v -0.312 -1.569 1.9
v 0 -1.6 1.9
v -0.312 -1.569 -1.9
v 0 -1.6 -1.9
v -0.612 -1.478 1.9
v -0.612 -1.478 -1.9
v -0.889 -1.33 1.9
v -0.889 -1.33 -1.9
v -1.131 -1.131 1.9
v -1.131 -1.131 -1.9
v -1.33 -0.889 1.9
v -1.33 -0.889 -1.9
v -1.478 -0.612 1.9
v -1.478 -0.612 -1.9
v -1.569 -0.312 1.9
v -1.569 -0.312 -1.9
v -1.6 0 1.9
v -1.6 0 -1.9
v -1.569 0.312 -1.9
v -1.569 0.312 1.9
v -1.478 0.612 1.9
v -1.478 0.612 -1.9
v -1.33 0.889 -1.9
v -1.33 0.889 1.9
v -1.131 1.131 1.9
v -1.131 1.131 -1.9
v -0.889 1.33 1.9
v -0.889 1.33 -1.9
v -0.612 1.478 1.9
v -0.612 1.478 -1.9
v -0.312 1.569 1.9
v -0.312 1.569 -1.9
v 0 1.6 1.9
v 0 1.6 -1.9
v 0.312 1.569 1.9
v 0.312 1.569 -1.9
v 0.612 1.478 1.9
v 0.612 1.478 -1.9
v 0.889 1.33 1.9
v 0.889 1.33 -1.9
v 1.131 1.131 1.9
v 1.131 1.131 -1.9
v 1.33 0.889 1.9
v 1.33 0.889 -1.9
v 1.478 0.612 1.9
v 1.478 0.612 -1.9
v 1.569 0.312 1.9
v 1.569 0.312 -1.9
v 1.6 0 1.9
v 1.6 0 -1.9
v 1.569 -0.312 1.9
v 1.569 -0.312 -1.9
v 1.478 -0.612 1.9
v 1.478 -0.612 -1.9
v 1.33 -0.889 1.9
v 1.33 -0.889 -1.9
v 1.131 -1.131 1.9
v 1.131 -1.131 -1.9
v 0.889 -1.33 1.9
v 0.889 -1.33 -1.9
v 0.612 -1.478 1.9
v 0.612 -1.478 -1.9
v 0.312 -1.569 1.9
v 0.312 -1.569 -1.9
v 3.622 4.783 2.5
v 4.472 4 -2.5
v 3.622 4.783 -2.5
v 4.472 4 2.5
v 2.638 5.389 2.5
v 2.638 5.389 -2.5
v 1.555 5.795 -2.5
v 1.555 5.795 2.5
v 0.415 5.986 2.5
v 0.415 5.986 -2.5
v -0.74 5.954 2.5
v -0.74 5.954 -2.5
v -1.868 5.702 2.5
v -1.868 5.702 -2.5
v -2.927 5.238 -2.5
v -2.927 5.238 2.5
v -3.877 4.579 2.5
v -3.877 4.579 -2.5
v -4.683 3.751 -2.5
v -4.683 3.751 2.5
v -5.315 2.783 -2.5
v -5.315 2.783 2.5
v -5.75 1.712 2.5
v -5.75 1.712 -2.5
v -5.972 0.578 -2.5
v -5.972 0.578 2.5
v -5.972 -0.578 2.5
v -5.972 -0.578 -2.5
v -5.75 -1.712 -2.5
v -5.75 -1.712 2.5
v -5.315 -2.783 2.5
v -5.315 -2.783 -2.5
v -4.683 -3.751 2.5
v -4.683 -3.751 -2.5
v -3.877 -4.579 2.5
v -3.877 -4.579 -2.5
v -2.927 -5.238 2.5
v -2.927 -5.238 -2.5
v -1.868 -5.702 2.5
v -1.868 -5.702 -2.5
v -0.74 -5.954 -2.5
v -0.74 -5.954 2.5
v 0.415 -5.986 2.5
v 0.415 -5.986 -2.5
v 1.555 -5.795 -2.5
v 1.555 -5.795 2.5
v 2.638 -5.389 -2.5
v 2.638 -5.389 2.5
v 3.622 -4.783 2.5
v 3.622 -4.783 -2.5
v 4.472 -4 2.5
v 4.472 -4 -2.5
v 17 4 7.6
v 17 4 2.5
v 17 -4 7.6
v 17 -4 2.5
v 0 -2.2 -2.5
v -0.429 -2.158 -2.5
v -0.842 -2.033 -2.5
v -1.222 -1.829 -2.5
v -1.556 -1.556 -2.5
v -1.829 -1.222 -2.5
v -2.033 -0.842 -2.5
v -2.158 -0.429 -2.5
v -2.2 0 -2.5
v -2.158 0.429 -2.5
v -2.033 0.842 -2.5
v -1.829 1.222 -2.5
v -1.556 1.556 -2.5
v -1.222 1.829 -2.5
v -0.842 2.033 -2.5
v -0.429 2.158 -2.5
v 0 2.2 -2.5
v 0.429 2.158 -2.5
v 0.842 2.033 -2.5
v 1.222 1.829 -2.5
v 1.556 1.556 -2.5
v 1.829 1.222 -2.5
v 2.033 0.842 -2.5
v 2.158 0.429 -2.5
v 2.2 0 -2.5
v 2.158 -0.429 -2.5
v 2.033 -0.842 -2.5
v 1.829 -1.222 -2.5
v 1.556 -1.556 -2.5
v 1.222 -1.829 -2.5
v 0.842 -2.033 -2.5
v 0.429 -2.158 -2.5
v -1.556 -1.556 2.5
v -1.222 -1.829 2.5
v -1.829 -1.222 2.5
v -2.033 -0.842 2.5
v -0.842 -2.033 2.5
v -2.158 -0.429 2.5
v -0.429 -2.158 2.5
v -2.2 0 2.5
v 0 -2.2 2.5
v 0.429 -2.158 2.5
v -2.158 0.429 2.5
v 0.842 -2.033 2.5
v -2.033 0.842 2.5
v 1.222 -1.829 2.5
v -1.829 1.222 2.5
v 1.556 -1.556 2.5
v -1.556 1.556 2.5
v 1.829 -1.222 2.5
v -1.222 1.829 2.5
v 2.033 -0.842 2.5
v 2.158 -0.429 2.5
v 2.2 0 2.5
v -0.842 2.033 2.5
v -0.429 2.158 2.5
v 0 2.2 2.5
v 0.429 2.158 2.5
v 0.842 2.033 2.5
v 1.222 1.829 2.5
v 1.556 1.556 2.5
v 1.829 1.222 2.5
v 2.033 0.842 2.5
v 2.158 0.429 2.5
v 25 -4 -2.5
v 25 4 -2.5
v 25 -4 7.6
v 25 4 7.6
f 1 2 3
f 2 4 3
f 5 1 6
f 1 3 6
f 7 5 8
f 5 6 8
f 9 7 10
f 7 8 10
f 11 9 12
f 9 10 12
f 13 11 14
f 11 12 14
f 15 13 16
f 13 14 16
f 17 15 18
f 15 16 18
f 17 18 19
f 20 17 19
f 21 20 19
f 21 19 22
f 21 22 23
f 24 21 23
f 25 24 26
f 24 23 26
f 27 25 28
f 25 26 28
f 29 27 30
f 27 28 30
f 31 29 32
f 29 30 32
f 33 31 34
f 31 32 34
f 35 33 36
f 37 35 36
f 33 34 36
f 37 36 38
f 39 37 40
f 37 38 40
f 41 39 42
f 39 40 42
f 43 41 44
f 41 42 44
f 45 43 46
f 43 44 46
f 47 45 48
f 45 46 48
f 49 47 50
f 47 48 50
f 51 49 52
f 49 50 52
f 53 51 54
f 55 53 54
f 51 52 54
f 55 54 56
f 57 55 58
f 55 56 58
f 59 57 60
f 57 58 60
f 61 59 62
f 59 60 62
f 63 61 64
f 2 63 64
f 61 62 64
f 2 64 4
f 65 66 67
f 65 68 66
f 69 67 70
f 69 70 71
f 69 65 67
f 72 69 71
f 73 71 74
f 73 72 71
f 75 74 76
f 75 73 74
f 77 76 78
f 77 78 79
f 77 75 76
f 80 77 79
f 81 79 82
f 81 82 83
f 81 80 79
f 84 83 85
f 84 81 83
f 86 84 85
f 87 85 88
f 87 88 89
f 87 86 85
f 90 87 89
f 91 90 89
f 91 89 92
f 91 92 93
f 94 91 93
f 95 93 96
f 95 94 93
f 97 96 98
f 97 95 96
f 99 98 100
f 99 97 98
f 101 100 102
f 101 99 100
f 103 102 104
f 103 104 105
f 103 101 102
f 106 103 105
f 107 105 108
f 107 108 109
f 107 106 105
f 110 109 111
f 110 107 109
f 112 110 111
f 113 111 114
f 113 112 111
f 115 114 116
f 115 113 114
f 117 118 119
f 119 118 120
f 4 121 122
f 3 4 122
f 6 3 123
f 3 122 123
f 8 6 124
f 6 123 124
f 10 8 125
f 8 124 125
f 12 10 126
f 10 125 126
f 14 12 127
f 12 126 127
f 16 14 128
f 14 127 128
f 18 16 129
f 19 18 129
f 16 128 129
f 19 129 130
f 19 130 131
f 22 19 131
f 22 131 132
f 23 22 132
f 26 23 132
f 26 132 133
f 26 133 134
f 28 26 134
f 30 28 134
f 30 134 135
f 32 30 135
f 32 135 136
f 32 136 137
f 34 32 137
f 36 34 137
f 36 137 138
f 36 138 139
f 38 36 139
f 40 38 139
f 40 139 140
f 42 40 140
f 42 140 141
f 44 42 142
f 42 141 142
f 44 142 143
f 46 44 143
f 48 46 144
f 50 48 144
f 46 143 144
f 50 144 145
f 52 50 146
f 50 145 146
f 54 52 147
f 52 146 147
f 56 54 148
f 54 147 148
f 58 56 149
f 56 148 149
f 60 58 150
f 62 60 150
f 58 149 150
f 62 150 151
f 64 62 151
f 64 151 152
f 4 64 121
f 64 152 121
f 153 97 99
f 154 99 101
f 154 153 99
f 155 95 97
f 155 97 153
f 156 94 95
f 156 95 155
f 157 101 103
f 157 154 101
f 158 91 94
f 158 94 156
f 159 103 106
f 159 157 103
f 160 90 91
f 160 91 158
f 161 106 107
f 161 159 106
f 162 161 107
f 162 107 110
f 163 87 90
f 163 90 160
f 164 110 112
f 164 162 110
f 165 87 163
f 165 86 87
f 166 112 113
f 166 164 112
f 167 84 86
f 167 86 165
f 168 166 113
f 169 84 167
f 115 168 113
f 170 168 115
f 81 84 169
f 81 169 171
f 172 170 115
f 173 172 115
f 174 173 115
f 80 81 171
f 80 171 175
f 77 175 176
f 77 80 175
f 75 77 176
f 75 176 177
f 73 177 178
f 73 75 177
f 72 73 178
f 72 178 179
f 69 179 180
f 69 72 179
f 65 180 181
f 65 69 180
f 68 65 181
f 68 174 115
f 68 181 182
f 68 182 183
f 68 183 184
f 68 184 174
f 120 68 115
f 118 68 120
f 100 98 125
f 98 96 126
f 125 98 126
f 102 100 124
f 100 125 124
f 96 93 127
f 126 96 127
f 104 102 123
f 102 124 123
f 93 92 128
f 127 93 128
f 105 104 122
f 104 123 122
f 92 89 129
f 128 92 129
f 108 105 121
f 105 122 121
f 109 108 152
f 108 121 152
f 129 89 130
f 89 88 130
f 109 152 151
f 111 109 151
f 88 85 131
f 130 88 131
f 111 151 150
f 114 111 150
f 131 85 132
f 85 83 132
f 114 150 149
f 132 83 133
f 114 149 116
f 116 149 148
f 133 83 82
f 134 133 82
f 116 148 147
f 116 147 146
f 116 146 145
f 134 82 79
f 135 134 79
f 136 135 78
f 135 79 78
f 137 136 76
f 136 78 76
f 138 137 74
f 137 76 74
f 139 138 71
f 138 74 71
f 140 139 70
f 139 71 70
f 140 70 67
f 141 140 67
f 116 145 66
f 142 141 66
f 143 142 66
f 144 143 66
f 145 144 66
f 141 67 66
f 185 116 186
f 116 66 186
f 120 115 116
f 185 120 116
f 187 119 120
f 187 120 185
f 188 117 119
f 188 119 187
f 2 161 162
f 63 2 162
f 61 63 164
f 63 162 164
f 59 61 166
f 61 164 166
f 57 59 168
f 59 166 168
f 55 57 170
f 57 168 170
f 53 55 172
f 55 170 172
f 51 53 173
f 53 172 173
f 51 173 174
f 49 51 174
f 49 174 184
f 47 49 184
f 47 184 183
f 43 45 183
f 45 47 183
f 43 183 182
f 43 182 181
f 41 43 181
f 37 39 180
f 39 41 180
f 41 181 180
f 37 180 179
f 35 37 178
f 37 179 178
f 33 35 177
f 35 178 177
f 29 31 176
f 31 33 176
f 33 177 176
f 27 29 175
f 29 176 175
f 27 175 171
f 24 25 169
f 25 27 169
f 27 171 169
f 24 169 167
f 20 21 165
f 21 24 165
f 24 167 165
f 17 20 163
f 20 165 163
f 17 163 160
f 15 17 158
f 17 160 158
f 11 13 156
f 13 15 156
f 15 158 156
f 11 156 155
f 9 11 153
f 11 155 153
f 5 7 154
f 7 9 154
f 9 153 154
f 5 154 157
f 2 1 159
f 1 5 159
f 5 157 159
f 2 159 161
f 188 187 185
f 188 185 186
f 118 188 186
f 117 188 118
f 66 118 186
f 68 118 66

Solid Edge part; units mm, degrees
sketch "Sketch1" plane through (0, 0, 0) normal (0, 0, 1) x (1, 0, 0)
  circle A0 centre (0, 0) radius 6
  dimension "D1" = 12
extrude "Protrusion1" add sketch "Sketch1" along normal mid plane 5
hole "hole" at (0, 0, 2.5) direction (0, 0, -1) diameter 3.2 depth 30 tip angle 118 start chamfer 0.6 start chamfer angle 45 end chamfer 0.6 end chamfer angle 45
sketch "Sketch2" plane through (0, 0, 2.5) normal (0, 0, 1) x (-1, 0, 0)
  line L0 (-25, -4) -> (-4.4721, -4)
  line L1 (-4.4721, -4) -> (-4.4721, 4)
  line L2 (-4.4721, 4) -> (-25, 4)
  line L3 (-25, 4) -> (-25, -4)
  dimension "D1" = 8
  dimension "D2" = 25
extrude "Protrusion2" add sketch "Sketch2" against normal up to vertex (5 mm away)
sketch "Sketch3" plane through (12, 0, 2.5) normal (0, 0, 1) x (1, 0, 0)
  line L0 (13, 4) -> (5, 4)
  line L1 (5, 4) -> (5, -4)
  line L2 (5, -4) -> (13, -4)
  line L3 (13, -4) -> (13, 4)
  dimension "D1" = 8
extrude "ExtrudedProtrusion_3" add sketch "Sketch3" along normal blind 5.1
properties material "Polyethylene, low density"
